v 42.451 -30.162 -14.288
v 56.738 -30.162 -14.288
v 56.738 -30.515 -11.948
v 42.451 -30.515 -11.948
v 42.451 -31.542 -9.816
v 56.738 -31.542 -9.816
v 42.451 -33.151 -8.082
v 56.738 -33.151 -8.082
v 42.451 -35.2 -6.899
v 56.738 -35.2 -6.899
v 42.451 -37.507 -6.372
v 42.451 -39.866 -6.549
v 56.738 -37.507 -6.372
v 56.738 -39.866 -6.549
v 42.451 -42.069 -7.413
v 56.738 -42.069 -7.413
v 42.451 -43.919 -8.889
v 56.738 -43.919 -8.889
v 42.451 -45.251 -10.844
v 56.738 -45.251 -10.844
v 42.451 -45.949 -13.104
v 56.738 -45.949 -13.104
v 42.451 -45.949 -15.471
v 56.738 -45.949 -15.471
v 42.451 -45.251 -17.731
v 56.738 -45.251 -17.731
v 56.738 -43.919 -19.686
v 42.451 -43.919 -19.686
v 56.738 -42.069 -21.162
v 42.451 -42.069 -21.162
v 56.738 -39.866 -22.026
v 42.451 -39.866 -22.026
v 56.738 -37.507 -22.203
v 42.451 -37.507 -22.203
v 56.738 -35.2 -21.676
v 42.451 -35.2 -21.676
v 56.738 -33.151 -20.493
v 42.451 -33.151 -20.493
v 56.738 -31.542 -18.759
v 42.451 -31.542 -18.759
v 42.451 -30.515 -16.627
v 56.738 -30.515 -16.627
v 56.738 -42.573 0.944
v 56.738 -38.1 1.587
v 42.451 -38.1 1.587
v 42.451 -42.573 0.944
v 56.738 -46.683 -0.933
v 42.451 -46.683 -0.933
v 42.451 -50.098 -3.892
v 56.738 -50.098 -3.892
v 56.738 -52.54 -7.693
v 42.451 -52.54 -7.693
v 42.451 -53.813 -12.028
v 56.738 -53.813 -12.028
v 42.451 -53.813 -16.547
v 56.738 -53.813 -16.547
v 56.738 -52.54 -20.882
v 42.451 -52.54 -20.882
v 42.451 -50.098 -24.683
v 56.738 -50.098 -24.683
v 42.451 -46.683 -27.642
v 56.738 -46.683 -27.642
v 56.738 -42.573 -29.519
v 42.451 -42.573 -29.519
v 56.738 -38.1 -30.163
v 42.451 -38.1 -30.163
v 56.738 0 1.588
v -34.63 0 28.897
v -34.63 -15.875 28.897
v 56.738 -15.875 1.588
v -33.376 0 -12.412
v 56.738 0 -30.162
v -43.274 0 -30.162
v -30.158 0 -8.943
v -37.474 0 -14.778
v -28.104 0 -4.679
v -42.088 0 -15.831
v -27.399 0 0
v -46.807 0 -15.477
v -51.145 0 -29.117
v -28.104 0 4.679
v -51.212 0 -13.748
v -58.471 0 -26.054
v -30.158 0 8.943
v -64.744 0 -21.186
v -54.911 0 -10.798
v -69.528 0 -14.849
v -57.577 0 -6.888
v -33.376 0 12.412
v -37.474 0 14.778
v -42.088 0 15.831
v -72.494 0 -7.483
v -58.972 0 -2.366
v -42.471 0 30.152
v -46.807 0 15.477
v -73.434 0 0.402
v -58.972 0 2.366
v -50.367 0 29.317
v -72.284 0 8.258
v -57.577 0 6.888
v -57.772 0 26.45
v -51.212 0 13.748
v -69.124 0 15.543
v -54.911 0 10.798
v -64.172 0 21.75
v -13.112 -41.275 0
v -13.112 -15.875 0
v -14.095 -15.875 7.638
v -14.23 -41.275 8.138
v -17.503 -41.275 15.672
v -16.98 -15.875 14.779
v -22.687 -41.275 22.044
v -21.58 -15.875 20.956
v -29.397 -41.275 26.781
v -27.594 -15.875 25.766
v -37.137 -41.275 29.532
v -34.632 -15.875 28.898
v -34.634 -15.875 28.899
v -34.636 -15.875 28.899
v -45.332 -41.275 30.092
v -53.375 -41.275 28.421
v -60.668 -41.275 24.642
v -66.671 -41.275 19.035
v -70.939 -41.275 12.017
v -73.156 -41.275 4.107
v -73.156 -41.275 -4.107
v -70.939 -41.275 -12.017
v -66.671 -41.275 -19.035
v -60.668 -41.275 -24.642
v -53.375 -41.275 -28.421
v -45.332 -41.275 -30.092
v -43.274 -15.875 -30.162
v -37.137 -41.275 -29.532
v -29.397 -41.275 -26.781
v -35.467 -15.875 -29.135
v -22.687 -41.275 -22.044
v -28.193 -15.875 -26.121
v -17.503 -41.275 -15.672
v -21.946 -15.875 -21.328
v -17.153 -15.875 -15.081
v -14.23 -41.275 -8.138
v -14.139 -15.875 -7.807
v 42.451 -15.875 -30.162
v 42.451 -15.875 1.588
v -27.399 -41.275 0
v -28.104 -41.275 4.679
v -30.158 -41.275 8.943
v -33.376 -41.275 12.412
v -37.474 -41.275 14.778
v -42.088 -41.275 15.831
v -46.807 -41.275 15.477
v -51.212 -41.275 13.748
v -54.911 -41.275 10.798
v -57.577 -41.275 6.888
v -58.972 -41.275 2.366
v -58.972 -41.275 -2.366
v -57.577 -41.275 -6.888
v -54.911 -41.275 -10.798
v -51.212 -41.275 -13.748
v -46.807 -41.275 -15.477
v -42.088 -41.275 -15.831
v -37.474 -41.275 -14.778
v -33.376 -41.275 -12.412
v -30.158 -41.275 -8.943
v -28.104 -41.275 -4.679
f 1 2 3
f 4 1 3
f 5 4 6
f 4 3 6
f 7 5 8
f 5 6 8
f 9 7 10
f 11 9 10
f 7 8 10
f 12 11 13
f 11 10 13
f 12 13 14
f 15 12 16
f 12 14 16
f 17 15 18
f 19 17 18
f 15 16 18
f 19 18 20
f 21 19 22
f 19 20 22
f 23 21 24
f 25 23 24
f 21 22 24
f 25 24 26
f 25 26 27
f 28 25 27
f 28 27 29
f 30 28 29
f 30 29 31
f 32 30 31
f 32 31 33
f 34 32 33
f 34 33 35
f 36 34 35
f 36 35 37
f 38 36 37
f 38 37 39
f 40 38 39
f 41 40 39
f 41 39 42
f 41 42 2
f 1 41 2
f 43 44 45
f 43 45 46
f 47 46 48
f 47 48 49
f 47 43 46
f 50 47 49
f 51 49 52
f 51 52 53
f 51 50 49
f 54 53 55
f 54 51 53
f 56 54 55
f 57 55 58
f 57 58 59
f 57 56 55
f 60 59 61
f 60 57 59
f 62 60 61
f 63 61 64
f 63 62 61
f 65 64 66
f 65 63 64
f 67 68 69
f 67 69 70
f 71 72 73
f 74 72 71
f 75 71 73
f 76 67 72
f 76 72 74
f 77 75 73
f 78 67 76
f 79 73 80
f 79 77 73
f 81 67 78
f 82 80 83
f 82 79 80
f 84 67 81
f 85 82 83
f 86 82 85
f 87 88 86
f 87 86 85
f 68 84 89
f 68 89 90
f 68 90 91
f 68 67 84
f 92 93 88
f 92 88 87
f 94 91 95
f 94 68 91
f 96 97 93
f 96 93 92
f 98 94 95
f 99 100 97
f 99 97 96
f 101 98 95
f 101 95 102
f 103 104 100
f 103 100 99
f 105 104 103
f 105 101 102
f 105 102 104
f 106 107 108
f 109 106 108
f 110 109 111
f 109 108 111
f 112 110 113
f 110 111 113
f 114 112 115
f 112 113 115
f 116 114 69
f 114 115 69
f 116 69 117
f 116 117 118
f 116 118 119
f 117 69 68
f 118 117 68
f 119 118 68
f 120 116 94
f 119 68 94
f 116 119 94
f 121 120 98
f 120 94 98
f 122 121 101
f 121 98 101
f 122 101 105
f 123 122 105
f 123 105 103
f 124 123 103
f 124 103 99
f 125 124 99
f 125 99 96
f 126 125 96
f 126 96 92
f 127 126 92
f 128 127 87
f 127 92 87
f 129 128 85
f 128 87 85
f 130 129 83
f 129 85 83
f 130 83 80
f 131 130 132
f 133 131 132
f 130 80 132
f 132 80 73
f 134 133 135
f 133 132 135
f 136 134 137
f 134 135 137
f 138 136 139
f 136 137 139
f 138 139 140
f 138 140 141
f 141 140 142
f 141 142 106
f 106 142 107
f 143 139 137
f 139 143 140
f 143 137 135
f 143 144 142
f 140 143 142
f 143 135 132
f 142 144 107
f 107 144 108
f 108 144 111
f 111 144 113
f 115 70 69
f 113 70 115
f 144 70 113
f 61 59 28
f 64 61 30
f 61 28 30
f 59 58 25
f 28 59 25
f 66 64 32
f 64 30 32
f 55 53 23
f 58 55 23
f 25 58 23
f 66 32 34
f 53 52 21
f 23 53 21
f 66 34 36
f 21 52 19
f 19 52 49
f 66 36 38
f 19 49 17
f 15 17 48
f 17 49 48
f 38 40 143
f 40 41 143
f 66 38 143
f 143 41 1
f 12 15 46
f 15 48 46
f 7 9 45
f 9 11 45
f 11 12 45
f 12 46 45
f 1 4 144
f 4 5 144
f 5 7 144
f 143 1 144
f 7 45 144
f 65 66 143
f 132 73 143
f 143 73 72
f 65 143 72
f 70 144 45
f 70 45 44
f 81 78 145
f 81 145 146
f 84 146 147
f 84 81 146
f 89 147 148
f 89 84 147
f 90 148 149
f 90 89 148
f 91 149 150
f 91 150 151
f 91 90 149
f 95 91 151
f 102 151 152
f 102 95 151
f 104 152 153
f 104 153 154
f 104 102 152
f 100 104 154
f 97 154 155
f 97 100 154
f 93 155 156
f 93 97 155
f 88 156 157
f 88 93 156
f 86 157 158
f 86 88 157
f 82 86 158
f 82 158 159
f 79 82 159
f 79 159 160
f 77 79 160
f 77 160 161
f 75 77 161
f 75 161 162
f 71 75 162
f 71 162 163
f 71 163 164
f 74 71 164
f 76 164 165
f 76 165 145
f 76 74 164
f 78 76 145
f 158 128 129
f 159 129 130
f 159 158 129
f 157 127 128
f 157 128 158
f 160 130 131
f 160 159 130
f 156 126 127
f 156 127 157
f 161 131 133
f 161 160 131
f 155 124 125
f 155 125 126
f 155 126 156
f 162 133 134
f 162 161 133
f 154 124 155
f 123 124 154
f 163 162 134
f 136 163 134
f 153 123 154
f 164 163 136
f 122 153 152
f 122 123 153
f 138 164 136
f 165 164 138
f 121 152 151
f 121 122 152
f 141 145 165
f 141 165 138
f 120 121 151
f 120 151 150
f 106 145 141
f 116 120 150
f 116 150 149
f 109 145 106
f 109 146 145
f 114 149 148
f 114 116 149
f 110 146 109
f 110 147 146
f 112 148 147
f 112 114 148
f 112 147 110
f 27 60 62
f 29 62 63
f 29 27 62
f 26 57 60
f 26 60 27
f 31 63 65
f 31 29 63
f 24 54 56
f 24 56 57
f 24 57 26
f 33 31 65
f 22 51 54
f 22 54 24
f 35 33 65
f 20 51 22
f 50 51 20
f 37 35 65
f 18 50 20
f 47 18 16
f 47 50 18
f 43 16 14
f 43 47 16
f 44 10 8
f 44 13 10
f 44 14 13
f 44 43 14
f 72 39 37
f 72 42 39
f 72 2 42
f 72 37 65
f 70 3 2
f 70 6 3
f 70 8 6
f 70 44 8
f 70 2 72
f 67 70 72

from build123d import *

# Parameters (mm, degrees)
F0_R     = 30.1625
F0_R_2   = 15.875
F1_DEPTH = 41.275
F3_DEPTH = 15.875
F4_W     = 14.2875
F4_H     = 31.75
F5_DEPTH = 22.225
F7_DEPTH = 14.2875
F8_R     = 7.9375
F9_DEPTH = 25.4


with BuildPart() as f1:
    # F0 (on Front) → F1 (new body)
    with BuildSketch(Plane.XZ):
        with Locations((-43.274074, 0)):
            Circle(F0_R)
        with Locations((-43.274074, 0)):
            Circle(F0_R_2, mode=Mode.SUBTRACT)
    extrude(amount=F1_DEPTH)

    # F2 (on face) → F3 (join)
    with BuildSketch(Plane(origin=(0, 0, 0), x_dir=(-1, 0, 0), z_dir=(0, 1, 0))):
        with BuildLine():
            Line((-56.738426, -30.1625), (43.274074, -30.1625))
            ThreePointArc((43.274074, -30.1625), (13.429074, -4.364901), (34.636165, 28.899185))
            Line((34.636165, 28.899185), (-56.738426, 1.5875))
            Line((-56.738426, 1.5875), (-56.738426, -30.1625))
        make_face()
    extrude(amount=-F3_DEPTH)

    # F4 (on face) → F5 (join)
    with BuildSketch(Plane.XZ.offset(15.875)):
        with Locations((49.594676, -14.2875)):
            Rectangle(F4_W, F4_H)
    extrude(amount=F5_DEPTH)

    # F6 (on face) → F7 (join)
    with BuildSketch(Plane.YZ.offset(56.738426)):
        with BuildLine():
            Line((-38.1, -30.1625), (-38.1, 1.5875))
            ThreePointArc((-38.1, 1.5875), (-53.975, -14.2875), (-38.1, -30.1625))
        make_face()
    extrude(amount=-F7_DEPTH)

    # F8 (on face) → F9 (cut)
    with BuildSketch(Plane.YZ.offset(56.738426)):
        with Locations((-38.1, -14.2875)):
            Circle(F8_R)
    extrude(amount=-F9_DEPTH, mode=Mode.SUBTRACT)


solid = f1.part
